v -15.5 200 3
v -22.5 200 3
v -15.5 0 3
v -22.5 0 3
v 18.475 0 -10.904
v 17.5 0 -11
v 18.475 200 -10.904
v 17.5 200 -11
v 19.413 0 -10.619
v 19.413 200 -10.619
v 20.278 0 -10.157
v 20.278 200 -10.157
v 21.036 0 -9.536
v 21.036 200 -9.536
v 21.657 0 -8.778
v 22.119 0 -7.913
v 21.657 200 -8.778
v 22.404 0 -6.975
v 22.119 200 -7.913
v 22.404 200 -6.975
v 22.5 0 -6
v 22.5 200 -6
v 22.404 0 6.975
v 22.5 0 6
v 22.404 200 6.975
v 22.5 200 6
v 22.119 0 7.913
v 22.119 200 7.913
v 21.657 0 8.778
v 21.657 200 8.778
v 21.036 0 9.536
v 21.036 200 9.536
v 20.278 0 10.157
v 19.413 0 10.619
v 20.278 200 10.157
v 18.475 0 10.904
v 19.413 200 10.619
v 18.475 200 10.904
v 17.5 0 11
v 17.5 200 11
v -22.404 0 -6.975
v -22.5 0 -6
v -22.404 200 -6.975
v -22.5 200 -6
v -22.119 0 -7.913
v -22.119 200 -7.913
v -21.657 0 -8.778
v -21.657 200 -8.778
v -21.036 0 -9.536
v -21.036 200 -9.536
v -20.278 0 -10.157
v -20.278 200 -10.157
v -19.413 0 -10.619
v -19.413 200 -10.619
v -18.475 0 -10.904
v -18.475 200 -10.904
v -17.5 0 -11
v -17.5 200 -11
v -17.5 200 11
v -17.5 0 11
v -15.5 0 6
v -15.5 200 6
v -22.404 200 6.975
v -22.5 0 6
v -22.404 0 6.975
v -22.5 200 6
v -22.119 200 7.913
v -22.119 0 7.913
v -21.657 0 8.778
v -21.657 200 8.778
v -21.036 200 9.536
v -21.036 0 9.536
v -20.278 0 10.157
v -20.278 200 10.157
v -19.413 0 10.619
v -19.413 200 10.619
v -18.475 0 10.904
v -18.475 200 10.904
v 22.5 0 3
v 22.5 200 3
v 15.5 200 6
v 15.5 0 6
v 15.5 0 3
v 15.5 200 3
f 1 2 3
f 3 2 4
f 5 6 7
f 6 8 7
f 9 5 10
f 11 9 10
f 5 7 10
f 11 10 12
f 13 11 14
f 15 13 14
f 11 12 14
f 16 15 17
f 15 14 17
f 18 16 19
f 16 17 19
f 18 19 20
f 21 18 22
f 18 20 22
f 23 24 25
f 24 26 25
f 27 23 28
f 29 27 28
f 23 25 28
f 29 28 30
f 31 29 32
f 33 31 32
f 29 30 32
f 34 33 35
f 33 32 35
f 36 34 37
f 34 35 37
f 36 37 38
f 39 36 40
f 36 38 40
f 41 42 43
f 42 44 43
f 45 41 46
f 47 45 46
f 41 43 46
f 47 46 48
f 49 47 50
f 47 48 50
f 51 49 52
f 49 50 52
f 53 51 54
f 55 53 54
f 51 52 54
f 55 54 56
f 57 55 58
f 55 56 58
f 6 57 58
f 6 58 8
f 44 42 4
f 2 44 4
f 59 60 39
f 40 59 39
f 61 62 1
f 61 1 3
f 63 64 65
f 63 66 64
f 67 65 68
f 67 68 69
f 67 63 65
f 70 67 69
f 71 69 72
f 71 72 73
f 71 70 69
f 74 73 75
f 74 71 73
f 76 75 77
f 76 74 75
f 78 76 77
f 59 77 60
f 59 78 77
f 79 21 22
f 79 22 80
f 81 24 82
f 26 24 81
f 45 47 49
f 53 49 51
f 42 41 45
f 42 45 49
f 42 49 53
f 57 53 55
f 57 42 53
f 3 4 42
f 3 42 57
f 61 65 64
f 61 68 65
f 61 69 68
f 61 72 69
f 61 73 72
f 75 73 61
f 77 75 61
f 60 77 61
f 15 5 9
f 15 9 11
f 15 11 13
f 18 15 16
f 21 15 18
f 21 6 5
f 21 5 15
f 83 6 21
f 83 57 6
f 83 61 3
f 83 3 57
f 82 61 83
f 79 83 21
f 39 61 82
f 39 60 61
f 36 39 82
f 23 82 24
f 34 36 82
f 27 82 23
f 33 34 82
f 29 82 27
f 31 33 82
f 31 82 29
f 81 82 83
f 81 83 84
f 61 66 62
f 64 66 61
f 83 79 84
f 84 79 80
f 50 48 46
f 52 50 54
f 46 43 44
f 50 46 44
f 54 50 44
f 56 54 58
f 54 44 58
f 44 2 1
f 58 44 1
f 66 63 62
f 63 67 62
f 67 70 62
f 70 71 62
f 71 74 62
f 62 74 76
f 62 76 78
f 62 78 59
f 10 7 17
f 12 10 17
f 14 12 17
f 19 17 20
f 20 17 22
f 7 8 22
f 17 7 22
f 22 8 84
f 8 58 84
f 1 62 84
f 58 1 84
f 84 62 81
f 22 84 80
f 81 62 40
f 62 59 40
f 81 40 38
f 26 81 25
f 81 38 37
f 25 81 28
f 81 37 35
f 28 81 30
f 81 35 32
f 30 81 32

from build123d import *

# Parameters (mm, degrees)
F0_W     = 45
F0_H     = 22
F1_DEPTH = 200
F2_R     = 5
F3_W     = 200
F3_H     = 3
F4_DEPTH = 7
F5_W     = 200
F5_H     = 3
F6_DEPTH = 7


with BuildPart() as f1:
    # F0 (on Front) → F1 (new body)
    with BuildSketch(Plane.XZ):
        Rectangle(F0_W, F0_H)
    extrude(amount=-F1_DEPTH)

    # F2
    f2_edges = [f1.edges().sort_by_distance(p)[0] for p in [
        (22.5, 100, 11),
        (-22.5, 100, 11),
        (22.5, 100, -11),
        (-22.5, 100, -11),
    ]]
    fillet(f2_edges, radius=F2_R)

    # F3 (on face) → F4 (cut)
    with BuildSketch(Plane.YZ.offset(22.5)):
        with Locations((100, 4.5)):
            Rectangle(F3_W, F3_H)
    extrude(amount=-F4_DEPTH, mode=Mode.SUBTRACT)

    # F5 (on face) → F6 (cut)
    with BuildSketch(Plane(origin=(-22.5, 0, 0), x_dir=(0, -1, 0), z_dir=(-1, 0, 0))):
        with Locations((-100, 4.5)):
            Rectangle(F5_W, F5_H)
    extrude(amount=-F6_DEPTH, mode=Mode.SUBTRACT)


solid = f1.part
